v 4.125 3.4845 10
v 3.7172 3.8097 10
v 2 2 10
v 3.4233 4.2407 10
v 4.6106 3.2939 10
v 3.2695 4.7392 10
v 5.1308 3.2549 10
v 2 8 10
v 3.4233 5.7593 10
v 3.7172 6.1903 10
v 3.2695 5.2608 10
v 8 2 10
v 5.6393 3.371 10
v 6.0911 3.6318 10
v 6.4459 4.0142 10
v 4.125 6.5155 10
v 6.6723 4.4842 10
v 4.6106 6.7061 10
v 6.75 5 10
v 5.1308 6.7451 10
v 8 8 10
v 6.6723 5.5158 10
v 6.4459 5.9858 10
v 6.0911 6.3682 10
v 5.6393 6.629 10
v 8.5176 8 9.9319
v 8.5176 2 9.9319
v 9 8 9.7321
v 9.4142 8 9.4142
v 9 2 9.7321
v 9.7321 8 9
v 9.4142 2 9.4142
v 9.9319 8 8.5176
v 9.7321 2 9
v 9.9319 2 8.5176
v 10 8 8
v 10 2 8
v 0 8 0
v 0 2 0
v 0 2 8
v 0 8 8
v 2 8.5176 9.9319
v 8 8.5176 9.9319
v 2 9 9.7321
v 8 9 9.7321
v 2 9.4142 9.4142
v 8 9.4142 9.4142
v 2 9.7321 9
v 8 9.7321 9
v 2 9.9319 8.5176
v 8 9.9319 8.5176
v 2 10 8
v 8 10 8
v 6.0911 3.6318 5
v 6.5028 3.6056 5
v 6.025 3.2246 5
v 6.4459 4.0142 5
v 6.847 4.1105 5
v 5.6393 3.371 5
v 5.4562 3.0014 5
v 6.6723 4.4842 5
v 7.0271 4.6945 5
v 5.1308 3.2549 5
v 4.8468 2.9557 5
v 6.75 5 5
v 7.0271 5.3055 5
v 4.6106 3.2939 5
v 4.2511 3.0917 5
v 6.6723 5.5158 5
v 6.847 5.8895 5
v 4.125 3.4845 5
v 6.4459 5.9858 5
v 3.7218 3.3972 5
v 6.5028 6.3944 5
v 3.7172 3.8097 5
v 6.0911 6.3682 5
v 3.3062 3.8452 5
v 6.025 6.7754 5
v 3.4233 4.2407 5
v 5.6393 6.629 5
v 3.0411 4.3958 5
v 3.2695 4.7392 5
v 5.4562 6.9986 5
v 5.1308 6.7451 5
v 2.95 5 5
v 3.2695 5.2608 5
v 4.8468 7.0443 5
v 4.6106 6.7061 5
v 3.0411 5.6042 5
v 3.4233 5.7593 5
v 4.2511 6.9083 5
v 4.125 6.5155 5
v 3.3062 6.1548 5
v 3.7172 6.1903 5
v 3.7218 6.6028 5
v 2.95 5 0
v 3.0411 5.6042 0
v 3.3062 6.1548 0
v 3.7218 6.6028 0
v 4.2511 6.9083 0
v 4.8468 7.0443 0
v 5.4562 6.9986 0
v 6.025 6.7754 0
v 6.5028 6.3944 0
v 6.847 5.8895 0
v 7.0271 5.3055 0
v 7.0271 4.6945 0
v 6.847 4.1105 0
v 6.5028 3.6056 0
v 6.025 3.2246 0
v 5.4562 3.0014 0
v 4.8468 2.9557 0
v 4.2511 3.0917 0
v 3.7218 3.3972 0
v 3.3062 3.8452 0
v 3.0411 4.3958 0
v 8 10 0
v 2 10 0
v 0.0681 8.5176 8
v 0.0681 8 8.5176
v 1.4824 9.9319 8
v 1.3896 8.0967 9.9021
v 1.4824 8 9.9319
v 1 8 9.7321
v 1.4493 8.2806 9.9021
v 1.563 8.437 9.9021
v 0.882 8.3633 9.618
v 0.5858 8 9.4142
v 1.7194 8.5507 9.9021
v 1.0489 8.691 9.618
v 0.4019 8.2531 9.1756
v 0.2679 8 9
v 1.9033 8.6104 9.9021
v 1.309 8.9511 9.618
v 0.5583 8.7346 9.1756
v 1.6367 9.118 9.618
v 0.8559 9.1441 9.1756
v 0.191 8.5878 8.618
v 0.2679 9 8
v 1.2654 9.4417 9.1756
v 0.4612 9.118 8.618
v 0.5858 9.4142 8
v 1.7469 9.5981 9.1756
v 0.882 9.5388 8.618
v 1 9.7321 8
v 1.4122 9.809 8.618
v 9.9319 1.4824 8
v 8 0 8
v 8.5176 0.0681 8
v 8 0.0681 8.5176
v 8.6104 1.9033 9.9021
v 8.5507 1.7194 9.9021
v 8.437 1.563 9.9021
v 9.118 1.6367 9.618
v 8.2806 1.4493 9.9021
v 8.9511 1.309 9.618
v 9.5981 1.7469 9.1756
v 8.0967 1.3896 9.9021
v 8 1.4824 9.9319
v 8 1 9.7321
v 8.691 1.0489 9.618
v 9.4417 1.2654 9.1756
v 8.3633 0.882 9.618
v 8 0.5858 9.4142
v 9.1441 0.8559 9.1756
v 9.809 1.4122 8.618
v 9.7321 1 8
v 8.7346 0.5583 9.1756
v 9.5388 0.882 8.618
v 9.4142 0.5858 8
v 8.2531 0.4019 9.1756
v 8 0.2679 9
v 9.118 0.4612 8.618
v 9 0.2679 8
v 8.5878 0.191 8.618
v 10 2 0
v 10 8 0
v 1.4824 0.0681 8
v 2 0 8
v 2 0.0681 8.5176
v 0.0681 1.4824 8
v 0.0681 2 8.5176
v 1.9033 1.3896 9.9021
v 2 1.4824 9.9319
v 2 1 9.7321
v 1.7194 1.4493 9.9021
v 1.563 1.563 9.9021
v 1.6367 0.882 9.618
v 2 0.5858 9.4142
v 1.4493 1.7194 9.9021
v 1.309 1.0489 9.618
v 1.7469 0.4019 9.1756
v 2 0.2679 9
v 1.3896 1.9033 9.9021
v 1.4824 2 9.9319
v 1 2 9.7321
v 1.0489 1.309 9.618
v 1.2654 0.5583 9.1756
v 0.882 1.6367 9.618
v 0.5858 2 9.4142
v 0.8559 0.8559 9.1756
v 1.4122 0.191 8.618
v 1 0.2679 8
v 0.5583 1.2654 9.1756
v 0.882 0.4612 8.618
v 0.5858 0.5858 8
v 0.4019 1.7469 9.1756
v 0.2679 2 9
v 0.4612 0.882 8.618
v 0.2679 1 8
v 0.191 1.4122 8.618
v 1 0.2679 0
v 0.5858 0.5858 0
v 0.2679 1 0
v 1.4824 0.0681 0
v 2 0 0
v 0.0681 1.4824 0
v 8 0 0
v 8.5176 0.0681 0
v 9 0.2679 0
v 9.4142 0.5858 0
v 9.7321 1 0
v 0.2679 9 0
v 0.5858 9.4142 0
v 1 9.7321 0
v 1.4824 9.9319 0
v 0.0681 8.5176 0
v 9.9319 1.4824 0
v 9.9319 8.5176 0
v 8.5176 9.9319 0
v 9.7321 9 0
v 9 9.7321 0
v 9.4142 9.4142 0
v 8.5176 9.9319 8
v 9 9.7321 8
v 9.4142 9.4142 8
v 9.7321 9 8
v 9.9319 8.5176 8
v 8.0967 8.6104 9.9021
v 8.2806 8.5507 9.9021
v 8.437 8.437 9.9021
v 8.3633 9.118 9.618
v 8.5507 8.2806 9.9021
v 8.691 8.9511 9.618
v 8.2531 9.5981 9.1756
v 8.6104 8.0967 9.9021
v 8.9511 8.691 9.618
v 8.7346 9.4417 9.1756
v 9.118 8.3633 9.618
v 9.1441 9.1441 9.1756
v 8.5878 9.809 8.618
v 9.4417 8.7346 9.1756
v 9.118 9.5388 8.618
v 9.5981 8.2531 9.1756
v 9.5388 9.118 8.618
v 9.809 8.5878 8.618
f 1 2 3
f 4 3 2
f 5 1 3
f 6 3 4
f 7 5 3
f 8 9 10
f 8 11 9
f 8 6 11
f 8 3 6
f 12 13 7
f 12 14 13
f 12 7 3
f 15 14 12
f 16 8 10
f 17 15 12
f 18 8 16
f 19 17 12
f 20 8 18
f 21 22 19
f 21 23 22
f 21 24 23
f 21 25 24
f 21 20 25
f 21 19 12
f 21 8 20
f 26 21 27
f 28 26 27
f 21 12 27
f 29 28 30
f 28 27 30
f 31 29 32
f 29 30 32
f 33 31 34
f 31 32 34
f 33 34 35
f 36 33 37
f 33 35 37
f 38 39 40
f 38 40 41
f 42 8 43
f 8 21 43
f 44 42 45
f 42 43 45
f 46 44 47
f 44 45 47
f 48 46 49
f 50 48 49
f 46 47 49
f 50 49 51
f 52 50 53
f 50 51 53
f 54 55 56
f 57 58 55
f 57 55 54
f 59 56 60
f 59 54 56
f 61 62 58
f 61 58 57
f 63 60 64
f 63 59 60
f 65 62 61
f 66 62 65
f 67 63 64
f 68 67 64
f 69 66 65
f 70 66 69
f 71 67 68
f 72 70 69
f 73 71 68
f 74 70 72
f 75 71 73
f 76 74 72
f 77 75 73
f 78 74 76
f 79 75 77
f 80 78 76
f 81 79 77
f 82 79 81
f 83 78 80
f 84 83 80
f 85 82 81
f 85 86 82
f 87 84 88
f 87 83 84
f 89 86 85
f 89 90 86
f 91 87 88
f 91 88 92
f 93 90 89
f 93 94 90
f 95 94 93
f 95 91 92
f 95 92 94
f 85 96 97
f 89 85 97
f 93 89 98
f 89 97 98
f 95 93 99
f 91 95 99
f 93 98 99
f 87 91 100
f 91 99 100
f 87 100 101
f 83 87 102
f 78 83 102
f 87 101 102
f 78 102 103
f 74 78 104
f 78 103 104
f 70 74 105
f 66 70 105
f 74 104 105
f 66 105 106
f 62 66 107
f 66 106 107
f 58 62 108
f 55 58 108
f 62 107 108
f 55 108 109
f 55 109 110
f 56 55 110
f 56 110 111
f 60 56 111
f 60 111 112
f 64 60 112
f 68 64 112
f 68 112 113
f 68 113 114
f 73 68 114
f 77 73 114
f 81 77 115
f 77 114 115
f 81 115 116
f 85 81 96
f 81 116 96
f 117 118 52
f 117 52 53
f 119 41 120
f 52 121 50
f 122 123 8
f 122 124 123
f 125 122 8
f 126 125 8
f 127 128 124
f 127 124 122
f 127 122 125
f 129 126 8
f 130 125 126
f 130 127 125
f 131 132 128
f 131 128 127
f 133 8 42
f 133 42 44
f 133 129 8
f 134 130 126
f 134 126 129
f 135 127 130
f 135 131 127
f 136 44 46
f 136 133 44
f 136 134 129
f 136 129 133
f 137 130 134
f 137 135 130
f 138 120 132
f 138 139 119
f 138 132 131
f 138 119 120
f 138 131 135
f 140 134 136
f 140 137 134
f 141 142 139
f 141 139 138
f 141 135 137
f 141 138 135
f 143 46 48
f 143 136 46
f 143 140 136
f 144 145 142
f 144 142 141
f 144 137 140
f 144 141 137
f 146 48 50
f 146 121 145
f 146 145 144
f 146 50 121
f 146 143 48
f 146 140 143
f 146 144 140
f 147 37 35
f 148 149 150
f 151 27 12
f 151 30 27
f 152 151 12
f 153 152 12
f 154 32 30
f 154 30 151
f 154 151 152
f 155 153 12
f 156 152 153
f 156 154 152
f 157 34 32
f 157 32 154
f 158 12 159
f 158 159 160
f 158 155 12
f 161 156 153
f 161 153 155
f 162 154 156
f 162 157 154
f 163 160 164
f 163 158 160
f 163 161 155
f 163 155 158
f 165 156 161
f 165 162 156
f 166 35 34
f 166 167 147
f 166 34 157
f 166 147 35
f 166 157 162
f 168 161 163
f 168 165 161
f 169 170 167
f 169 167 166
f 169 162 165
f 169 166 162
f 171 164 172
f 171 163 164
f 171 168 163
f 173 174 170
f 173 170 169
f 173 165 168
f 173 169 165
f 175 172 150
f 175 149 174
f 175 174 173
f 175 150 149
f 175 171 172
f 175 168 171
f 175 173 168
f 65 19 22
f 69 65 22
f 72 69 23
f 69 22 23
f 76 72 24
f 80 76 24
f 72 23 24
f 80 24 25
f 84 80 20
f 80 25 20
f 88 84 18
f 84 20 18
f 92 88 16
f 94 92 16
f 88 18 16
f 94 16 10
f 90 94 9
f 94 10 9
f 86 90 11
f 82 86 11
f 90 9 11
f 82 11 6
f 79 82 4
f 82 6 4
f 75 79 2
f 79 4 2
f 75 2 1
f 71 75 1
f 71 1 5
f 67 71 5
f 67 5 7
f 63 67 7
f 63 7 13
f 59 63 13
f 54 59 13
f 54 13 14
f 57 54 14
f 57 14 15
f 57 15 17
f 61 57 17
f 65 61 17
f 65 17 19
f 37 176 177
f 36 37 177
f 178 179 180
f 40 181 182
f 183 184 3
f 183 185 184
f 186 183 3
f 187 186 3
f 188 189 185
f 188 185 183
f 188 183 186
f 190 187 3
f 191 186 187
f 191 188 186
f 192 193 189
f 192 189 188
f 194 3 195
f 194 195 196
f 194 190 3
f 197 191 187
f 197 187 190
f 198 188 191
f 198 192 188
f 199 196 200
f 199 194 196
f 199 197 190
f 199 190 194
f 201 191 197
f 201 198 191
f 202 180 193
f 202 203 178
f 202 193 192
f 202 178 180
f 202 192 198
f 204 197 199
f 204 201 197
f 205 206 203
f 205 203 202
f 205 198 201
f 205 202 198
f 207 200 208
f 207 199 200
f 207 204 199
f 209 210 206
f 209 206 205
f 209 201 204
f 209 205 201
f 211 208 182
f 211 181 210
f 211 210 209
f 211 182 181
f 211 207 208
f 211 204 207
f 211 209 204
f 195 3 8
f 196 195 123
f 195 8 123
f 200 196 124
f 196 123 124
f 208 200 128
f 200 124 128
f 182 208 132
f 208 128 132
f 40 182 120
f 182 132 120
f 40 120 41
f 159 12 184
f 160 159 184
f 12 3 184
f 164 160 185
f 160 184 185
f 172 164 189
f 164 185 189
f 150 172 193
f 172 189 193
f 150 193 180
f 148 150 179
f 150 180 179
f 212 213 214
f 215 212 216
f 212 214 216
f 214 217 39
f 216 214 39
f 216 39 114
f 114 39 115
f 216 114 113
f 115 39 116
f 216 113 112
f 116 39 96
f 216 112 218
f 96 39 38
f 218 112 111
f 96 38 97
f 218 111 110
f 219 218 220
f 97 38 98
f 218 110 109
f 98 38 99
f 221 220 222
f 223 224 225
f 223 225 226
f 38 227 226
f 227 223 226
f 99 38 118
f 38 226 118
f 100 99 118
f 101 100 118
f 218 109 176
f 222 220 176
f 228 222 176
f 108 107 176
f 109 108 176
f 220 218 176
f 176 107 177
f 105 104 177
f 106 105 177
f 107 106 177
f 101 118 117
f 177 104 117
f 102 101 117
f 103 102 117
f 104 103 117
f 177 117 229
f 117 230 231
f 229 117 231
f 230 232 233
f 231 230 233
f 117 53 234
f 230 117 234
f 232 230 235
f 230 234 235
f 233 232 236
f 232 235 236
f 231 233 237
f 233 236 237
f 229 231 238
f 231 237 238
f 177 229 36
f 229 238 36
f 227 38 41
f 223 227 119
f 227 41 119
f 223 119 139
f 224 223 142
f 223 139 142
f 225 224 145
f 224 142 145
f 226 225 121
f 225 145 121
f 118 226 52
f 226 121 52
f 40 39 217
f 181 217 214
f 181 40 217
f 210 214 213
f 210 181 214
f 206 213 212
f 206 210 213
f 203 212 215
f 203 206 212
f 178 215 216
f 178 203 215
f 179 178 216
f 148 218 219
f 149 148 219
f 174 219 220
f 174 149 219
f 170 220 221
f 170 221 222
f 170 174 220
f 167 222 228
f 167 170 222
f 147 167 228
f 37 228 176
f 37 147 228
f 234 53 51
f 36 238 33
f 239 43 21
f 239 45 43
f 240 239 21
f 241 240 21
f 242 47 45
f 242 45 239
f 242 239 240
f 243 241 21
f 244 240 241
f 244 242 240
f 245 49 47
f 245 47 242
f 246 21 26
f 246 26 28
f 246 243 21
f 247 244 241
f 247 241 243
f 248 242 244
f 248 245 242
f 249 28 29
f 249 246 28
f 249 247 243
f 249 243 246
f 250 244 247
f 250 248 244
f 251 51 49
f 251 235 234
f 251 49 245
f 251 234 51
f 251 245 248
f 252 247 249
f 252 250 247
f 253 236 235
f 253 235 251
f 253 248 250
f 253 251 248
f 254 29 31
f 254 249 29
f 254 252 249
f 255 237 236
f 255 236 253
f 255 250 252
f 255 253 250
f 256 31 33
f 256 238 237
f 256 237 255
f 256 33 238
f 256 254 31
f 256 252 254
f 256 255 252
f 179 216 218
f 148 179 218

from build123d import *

# Parameters (mm, degrees)
SKETCH1_W           = 10
SKETCH1_H           = 10
BOSS_EXTRUDE1_DEPTH = 10
SKETCH2_R           = 1.75
CUT_EXTRUDE1_DEPTH  = 11
SKETCH3_R           = 2.05
CUT_EXTRUDE2_DEPTH  = 5
FILLET1_R           = 2
FILLET2_R           = 2


with BuildPart() as part:
    # Sketch1 → Boss-Extrude1 (new body)
    with BuildSketch(Plane.XY):
        with Locations((5, 5)):
            Rectangle(SKETCH1_W, SKETCH1_H)
    extrude(amount=BOSS_EXTRUDE1_DEPTH)

    # Sketch2 → Cut-Extrude1 (cut, through all)
    with BuildSketch(Plane.XY.offset(10)):
        with Locations((5, 5)):
            Circle(SKETCH2_R)
    extrude(amount=-CUT_EXTRUDE1_DEPTH, mode=Mode.SUBTRACT)

    # Sketch3 → Cut-Extrude2 (cut)
    with BuildSketch(Plane(origin=(0, 0, 0), x_dir=(-1, 0, 0), z_dir=(0, 0, -1))):
        with Locations((-5, 5)):
            Circle(SKETCH3_R)
    extrude(amount=-CUT_EXTRUDE2_DEPTH, mode=Mode.SUBTRACT)

    # Fillet1
    fillet1_edges = [part.edges().sort_by_distance(p)[0] for p in [
        (0, 10, 5),
        (10, 10, 5),
        (10, 0, 5),
        (0, 0, 5),
    ]]
    fillet(fillet1_edges, radius=FILLET1_R)

    # Fillet2
    fillet2_edges = [part.edges().sort_by_distance(p)[0] for p in [
        (5, 10, 10),
        (10, 5, 10),
        (0, 5, 10),
        (5, 0, 10),
        (9.414213562, 0.585786438, 10),
        (0.585786438, 0.585786438, 10),
        (0.585786438, 9.414213562, 10),
        (9.414213562, 9.414213562, 10),
    ]]
    fillet(fillet2_edges, radius=FILLET2_R)


solid = part.part
